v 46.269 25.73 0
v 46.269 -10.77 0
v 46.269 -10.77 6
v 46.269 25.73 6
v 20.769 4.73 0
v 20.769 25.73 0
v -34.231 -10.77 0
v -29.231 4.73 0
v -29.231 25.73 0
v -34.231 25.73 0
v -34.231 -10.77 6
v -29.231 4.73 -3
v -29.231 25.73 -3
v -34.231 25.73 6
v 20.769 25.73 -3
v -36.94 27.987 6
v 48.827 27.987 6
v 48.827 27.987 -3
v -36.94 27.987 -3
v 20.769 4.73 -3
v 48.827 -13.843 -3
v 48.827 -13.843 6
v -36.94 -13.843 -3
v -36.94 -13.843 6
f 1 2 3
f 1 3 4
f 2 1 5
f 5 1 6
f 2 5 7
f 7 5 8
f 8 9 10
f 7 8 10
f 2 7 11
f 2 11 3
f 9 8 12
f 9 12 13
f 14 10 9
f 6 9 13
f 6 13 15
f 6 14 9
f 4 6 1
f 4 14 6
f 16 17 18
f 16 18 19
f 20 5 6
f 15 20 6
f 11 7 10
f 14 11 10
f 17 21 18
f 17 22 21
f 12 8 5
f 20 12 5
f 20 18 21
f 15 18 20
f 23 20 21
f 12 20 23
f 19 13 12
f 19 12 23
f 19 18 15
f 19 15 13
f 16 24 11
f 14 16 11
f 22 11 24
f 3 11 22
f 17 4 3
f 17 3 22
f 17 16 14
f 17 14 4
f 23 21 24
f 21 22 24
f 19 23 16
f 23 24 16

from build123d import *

# Parameters (mm, degrees)
SKETCH2_W           = 85.76635514
SKETCH2_H           = 41.829906542
SKETCH2_W_2         = 80.5
SKETCH2_H_2         = 36.5
BOSS_EXTRUDE1_DEPTH = 6
SKETCH4_W           = 85.76635514
SKETCH4_H           = 41.829906542
BOSS_EXTRUDE2_DEPTH = 3
SKETCH6_W           = 50
SKETCH6_H           = 21
CUT_EXTRUDE1_DEPTH  = 10


with BuildPart() as part:
    # Sketch2 → Boss-Extrude1 (new body)
    with BuildSketch(Plane.XY):
        with Locations((5.943457944, 7.071962617)):
            Rectangle(SKETCH2_W, SKETCH2_H)
        with Locations((6.018691589, 7.479906542)):
            Rectangle(SKETCH2_W_2, SKETCH2_H_2, mode=Mode.SUBTRACT)
    extrude(amount=BOSS_EXTRUDE1_DEPTH)

    # Sketch4 → Boss-Extrude2 (add)
    with BuildSketch(Plane(origin=(0, 0, 0), x_dir=(-1, 0, 0), z_dir=(0, 0, -1))):
        with Locations((-5.943457944, 7.071962617)):
            Rectangle(SKETCH4_W, SKETCH4_H)
    extrude(amount=BOSS_EXTRUDE2_DEPTH)

    # Sketch6 → Cut-Extrude1 (cut)
    with BuildSketch(Plane.XY):
        with Locations((-4.231308411, 15.229906542)):
            Rectangle(SKETCH6_W, SKETCH6_H)
    extrude(amount=-CUT_EXTRUDE1_DEPTH, mode=Mode.SUBTRACT)


solid = part.part
